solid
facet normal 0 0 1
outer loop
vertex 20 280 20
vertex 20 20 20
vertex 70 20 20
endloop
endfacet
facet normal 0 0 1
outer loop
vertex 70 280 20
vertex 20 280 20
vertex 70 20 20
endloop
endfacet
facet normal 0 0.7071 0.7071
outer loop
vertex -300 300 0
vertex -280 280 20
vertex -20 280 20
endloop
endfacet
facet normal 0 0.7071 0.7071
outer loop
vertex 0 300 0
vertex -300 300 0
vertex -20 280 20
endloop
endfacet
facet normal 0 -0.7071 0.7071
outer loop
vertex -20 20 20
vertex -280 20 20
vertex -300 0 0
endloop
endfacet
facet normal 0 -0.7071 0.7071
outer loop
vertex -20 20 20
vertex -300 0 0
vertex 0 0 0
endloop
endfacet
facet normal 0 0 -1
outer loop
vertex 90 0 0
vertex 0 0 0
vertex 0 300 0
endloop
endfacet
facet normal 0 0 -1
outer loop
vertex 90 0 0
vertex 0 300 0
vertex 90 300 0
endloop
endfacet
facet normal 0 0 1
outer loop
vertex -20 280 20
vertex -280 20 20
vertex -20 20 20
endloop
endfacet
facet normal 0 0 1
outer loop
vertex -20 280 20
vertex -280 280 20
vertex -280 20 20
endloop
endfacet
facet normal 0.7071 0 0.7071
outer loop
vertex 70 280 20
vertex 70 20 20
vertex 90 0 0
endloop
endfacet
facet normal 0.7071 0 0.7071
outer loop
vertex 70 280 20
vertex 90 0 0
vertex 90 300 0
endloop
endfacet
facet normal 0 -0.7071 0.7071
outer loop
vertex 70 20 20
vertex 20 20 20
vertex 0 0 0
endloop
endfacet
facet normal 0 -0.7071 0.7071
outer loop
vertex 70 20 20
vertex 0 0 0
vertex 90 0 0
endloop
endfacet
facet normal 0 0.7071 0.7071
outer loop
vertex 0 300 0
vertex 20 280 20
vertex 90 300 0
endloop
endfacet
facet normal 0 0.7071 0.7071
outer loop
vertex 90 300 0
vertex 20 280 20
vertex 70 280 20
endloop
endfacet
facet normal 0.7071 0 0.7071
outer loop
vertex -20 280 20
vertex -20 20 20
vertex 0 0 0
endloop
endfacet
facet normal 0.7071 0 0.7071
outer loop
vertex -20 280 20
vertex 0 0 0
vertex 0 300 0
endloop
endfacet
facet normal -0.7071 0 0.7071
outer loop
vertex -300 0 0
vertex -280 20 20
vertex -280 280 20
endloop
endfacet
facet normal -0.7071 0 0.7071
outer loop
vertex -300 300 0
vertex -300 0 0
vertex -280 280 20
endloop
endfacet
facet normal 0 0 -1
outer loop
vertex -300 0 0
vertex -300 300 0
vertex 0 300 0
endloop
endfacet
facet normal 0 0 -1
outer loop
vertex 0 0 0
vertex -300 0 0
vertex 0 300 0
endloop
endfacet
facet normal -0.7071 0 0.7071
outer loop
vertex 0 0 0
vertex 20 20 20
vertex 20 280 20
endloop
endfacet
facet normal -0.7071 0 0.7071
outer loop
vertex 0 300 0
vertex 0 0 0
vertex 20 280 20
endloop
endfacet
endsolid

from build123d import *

# Parameters (mm, degrees)
F0_W     = 300
F0_H     = 300
F1_DEPTH = 20
F2_SIZE  = 19.99999
F3_W     = 90
F3_H     = 300
F4_DEPTH = 20
F5_SIZE  = 19.99999


# Not quite as in the source:
# - a fillet or chamfer is up to 0.001 mm smaller than in the source, because OpenCascade refuses the exact size


with BuildPart() as f1:
    # F0 (on Top) → F1 (new body)
    with BuildSketch(Plane.XY):
        with Locations((-150, 150)):
            Rectangle(F0_W, F0_H)
    extrude(amount=F1_DEPTH)

    # F2 (size 20 in the source; OpenCascade refuses exactly that, so slightly less here)
    f2_edges = [f1.edges().sort_by_distance(p)[0] for p in [
        (-150, 0, 20),
        (0, 150, 20),
        (-150, 300, 20),
        (-300, 150, 20),
    ]]
    chamfer(f2_edges, length=F2_SIZE)


with BuildPart() as f4:
    # F3 (on Top) → F4 (new body)
    with BuildSketch(Plane.XY):
        with Locations((45, 150)):
            Rectangle(F3_W, F3_H)
    extrude(amount=F4_DEPTH)

    # F5 (size 20 in the source; OpenCascade refuses exactly that, so slightly less here)
    f5_edges = [f4.edges().sort_by_distance(p)[0] for p in [
        (0, 150, 20),
        (45, 0, 20),
        (90, 150, 20),
        (45, 300, 20),
    ]]
    chamfer(f5_edges, length=F5_SIZE)


solid = Compound([f1.part, f4.part])
